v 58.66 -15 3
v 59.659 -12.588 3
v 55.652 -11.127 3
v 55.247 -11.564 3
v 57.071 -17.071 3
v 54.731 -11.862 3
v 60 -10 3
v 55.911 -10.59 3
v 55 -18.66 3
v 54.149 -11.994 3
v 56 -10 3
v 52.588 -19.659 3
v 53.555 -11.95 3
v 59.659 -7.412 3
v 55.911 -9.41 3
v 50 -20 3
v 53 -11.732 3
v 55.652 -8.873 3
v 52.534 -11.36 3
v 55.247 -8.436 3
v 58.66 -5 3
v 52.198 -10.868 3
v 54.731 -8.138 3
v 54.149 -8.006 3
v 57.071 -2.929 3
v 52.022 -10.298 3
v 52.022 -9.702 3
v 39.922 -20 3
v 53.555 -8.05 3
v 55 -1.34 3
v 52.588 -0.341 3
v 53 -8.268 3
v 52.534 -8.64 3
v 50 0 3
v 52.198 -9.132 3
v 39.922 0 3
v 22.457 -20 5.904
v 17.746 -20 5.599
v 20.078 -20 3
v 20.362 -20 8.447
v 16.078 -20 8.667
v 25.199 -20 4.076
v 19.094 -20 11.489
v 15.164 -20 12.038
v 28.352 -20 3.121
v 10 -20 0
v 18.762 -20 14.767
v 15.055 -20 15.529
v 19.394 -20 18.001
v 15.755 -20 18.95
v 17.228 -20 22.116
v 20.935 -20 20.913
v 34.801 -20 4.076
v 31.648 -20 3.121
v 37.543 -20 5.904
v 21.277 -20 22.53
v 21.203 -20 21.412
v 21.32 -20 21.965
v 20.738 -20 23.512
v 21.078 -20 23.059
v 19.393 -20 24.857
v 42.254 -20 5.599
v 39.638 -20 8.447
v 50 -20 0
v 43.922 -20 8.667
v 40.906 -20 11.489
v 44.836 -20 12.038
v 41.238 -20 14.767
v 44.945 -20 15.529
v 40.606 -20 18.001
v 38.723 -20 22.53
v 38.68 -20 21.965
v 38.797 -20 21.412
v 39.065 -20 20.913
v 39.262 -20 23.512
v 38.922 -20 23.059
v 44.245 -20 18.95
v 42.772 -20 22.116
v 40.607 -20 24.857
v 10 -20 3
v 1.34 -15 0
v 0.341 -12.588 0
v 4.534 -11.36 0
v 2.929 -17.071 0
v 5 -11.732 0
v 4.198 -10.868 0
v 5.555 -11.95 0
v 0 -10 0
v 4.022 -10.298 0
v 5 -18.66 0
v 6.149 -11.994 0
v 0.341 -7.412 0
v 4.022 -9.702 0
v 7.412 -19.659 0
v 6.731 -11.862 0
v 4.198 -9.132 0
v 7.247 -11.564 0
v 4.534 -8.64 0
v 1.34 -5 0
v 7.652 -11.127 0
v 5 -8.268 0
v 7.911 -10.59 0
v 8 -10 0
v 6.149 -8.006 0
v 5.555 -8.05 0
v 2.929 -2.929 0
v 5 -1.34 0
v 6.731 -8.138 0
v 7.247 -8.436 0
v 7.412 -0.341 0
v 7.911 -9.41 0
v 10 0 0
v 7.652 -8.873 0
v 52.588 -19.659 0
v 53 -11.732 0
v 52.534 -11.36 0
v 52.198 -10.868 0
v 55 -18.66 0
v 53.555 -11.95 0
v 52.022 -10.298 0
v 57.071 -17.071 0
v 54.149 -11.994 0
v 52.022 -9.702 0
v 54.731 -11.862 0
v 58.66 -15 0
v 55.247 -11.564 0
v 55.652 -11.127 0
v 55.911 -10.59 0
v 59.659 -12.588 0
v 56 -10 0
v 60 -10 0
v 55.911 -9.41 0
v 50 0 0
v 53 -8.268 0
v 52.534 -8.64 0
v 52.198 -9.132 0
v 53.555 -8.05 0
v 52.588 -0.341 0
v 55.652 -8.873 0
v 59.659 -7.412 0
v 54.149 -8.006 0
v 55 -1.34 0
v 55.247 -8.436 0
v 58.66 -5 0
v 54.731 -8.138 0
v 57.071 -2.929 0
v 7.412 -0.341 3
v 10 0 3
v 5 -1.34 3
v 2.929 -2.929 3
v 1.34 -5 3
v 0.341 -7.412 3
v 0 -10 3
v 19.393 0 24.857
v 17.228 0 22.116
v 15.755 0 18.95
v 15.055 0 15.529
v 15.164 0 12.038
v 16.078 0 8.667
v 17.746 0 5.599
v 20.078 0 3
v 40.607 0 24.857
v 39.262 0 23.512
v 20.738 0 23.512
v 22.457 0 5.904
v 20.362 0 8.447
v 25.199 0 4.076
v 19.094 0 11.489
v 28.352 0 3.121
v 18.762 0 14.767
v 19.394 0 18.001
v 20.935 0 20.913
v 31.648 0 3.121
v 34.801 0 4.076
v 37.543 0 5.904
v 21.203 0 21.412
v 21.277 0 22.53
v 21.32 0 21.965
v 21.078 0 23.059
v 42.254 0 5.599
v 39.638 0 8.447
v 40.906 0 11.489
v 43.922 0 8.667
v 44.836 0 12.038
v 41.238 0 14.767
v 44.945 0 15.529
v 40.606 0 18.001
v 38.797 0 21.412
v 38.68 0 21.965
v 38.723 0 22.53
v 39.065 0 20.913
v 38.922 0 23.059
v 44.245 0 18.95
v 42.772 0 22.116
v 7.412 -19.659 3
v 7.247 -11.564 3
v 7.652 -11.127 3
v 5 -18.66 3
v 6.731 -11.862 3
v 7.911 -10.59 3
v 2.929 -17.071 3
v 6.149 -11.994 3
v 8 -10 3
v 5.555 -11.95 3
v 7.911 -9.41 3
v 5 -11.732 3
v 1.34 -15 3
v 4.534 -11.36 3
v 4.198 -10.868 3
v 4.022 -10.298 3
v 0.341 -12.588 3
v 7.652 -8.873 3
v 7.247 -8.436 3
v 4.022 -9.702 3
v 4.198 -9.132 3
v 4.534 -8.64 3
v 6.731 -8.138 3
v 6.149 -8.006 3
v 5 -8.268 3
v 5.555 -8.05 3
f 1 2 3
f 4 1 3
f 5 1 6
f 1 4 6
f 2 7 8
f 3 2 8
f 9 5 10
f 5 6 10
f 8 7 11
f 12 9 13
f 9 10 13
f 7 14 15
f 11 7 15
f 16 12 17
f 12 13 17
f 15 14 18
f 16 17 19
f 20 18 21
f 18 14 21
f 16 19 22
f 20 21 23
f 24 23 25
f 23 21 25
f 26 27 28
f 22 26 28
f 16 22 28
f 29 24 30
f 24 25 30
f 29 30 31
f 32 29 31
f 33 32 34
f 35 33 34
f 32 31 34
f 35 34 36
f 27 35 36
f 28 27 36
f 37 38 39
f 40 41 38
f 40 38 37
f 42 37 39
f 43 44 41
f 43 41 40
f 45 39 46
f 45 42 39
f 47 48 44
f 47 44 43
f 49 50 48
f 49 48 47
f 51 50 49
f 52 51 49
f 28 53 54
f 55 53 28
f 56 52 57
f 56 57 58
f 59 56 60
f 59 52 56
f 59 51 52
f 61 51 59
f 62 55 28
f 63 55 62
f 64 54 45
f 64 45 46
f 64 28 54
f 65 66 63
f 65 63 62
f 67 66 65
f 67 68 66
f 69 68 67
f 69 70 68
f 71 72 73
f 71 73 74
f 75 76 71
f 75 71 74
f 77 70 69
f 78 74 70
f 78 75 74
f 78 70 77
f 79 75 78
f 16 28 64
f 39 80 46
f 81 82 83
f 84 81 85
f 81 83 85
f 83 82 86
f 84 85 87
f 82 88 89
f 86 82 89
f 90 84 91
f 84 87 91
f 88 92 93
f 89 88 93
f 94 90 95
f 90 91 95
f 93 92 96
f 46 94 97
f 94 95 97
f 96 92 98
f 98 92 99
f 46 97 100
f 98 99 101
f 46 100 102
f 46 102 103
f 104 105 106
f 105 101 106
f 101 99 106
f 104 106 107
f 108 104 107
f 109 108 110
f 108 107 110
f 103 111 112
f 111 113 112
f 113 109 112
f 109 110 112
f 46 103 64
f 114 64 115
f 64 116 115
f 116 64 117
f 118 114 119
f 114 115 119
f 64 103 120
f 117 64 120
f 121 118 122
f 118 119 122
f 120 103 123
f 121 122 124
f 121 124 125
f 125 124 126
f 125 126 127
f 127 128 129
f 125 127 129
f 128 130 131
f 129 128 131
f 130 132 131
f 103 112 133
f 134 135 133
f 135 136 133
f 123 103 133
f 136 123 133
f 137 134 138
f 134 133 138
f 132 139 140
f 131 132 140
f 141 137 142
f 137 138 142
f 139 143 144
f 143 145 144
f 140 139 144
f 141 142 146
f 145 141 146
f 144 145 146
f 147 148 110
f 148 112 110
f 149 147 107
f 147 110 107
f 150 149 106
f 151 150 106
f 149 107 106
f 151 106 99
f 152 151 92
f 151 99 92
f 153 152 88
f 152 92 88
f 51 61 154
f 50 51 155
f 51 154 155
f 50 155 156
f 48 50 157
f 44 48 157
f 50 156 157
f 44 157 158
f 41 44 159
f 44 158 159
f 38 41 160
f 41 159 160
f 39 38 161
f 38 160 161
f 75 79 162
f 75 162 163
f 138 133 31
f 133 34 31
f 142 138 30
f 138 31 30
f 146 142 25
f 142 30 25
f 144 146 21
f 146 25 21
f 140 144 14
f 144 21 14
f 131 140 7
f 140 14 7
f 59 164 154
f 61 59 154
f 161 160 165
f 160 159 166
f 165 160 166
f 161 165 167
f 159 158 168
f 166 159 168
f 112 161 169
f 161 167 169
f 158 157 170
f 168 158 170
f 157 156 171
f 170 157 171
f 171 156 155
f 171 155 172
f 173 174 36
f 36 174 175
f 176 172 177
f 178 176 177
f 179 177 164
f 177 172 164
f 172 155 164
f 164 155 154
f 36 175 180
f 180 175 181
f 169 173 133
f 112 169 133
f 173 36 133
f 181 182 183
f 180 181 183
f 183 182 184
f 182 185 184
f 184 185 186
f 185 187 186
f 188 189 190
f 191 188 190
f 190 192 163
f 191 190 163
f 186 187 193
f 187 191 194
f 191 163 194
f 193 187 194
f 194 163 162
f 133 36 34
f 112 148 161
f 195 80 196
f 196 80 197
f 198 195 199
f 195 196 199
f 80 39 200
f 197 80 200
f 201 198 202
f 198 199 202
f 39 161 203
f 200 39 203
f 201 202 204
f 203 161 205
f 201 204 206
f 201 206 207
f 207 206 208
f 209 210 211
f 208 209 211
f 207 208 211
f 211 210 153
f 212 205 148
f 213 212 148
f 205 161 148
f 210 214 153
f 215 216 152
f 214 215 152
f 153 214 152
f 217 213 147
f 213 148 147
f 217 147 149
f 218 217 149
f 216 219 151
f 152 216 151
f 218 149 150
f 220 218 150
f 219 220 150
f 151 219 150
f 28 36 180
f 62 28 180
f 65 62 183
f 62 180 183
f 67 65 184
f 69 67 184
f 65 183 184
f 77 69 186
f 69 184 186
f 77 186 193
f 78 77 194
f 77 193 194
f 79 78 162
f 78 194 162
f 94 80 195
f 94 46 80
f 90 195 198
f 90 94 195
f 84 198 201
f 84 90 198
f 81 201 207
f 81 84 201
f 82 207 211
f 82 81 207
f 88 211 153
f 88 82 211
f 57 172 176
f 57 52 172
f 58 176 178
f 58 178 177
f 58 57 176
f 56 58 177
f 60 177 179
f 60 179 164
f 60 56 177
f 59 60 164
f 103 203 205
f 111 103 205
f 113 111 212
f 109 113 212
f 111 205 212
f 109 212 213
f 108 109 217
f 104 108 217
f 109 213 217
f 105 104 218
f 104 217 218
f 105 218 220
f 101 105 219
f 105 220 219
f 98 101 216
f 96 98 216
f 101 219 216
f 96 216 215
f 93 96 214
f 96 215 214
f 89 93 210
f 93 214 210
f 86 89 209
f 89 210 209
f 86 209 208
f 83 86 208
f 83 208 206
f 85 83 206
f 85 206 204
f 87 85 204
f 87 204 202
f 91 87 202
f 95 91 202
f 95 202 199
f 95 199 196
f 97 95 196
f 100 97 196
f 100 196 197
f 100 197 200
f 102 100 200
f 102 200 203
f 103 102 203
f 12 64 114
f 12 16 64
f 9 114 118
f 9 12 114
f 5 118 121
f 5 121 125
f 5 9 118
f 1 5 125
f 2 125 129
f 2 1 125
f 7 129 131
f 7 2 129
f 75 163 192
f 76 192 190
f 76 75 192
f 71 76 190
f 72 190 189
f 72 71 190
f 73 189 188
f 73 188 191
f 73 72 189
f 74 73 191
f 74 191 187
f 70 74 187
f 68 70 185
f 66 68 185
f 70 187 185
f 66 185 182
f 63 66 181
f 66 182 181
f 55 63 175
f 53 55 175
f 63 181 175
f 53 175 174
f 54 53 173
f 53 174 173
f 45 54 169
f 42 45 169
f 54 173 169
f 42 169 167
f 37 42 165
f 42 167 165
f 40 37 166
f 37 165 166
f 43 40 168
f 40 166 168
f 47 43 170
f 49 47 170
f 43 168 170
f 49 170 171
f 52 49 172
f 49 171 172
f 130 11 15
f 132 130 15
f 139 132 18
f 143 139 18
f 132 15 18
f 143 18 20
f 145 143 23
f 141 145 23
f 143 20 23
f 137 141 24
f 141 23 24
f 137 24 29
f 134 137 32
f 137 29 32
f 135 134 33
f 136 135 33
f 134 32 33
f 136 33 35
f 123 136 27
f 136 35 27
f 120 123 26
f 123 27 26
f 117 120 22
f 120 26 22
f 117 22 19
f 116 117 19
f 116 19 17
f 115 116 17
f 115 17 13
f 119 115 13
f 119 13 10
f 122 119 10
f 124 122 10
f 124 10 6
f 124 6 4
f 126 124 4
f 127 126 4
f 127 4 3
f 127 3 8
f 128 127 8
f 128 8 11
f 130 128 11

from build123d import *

# Parameters (mm, degrees)
F1_DEPTH = 20
F2_R     = 2
F3_R     = 2
F4_DEPTH = 25
F5_R     = 9.99999


# Not quite as in the source:
# - a fillet or chamfer is up to 0.001 mm smaller than in the source, because OpenCascade refuses the exact size


with BuildPart() as f1:
    # F0 (on Front) → F1 (new body)
    with BuildSketch(Plane.XZ):
        with BuildLine():
            Line((0, 3), (0, 0))
            Line((0, 0), (60, 0))
            Line((60, 0), (60, 3))
            Line((60, 3), (39.9215674165, 3))
            ThreePointArc((39.9215674165, 3), (44.9926379155, 13.7800975251), (40.6066017178, 24.8566017178))
            Line((40.6066017178, 24.8566017178), (37.9549512883, 22.2049512883))
            ThreePointArc((37.9549512883, 22.2049512883), (30, 3), (22.0450487117, 22.2049512883))
            Line((22.0450487117, 22.2049512883), (19.3933982822, 24.8566017178))
            ThreePointArc((19.3933982822, 24.8566017178), (15.0073620845, 13.7800975251), (20.0784325835, 3))
            Line((20.0784325835, 3), (0, 3))
        make_face()
    extrude(amount=F1_DEPTH)

    # F2
    f2_edges = [f1.edges().sort_by_distance(p)[0] for p in [
        (22.045049, -10, 22.204951),
        (37.954951, -10, 22.204951),
    ]]
    fillet(f2_edges, radius=F2_R)

    # F3 (on face) → F4 (cut)
    with BuildSketch(Plane.XY.offset(3)):
        with Locations((6, -10)):
            Circle(F3_R)
        with Locations((54, -10)):
            Circle(F3_R)
    extrude(amount=-F4_DEPTH, mode=Mode.SUBTRACT)

    # F5 (radius 10 in the source; OpenCascade refuses exactly that, so slightly less here)
    f5_edges = [f1.edges().sort_by_distance(p)[0] for p in [
        (0, 0, 1.5),
        (0, -20, 1.5),
        (60, -20, 1.5),
        (60, 0, 1.5),
    ]]
    fillet(f5_edges, radius=F5_R)


solid = f1.part
